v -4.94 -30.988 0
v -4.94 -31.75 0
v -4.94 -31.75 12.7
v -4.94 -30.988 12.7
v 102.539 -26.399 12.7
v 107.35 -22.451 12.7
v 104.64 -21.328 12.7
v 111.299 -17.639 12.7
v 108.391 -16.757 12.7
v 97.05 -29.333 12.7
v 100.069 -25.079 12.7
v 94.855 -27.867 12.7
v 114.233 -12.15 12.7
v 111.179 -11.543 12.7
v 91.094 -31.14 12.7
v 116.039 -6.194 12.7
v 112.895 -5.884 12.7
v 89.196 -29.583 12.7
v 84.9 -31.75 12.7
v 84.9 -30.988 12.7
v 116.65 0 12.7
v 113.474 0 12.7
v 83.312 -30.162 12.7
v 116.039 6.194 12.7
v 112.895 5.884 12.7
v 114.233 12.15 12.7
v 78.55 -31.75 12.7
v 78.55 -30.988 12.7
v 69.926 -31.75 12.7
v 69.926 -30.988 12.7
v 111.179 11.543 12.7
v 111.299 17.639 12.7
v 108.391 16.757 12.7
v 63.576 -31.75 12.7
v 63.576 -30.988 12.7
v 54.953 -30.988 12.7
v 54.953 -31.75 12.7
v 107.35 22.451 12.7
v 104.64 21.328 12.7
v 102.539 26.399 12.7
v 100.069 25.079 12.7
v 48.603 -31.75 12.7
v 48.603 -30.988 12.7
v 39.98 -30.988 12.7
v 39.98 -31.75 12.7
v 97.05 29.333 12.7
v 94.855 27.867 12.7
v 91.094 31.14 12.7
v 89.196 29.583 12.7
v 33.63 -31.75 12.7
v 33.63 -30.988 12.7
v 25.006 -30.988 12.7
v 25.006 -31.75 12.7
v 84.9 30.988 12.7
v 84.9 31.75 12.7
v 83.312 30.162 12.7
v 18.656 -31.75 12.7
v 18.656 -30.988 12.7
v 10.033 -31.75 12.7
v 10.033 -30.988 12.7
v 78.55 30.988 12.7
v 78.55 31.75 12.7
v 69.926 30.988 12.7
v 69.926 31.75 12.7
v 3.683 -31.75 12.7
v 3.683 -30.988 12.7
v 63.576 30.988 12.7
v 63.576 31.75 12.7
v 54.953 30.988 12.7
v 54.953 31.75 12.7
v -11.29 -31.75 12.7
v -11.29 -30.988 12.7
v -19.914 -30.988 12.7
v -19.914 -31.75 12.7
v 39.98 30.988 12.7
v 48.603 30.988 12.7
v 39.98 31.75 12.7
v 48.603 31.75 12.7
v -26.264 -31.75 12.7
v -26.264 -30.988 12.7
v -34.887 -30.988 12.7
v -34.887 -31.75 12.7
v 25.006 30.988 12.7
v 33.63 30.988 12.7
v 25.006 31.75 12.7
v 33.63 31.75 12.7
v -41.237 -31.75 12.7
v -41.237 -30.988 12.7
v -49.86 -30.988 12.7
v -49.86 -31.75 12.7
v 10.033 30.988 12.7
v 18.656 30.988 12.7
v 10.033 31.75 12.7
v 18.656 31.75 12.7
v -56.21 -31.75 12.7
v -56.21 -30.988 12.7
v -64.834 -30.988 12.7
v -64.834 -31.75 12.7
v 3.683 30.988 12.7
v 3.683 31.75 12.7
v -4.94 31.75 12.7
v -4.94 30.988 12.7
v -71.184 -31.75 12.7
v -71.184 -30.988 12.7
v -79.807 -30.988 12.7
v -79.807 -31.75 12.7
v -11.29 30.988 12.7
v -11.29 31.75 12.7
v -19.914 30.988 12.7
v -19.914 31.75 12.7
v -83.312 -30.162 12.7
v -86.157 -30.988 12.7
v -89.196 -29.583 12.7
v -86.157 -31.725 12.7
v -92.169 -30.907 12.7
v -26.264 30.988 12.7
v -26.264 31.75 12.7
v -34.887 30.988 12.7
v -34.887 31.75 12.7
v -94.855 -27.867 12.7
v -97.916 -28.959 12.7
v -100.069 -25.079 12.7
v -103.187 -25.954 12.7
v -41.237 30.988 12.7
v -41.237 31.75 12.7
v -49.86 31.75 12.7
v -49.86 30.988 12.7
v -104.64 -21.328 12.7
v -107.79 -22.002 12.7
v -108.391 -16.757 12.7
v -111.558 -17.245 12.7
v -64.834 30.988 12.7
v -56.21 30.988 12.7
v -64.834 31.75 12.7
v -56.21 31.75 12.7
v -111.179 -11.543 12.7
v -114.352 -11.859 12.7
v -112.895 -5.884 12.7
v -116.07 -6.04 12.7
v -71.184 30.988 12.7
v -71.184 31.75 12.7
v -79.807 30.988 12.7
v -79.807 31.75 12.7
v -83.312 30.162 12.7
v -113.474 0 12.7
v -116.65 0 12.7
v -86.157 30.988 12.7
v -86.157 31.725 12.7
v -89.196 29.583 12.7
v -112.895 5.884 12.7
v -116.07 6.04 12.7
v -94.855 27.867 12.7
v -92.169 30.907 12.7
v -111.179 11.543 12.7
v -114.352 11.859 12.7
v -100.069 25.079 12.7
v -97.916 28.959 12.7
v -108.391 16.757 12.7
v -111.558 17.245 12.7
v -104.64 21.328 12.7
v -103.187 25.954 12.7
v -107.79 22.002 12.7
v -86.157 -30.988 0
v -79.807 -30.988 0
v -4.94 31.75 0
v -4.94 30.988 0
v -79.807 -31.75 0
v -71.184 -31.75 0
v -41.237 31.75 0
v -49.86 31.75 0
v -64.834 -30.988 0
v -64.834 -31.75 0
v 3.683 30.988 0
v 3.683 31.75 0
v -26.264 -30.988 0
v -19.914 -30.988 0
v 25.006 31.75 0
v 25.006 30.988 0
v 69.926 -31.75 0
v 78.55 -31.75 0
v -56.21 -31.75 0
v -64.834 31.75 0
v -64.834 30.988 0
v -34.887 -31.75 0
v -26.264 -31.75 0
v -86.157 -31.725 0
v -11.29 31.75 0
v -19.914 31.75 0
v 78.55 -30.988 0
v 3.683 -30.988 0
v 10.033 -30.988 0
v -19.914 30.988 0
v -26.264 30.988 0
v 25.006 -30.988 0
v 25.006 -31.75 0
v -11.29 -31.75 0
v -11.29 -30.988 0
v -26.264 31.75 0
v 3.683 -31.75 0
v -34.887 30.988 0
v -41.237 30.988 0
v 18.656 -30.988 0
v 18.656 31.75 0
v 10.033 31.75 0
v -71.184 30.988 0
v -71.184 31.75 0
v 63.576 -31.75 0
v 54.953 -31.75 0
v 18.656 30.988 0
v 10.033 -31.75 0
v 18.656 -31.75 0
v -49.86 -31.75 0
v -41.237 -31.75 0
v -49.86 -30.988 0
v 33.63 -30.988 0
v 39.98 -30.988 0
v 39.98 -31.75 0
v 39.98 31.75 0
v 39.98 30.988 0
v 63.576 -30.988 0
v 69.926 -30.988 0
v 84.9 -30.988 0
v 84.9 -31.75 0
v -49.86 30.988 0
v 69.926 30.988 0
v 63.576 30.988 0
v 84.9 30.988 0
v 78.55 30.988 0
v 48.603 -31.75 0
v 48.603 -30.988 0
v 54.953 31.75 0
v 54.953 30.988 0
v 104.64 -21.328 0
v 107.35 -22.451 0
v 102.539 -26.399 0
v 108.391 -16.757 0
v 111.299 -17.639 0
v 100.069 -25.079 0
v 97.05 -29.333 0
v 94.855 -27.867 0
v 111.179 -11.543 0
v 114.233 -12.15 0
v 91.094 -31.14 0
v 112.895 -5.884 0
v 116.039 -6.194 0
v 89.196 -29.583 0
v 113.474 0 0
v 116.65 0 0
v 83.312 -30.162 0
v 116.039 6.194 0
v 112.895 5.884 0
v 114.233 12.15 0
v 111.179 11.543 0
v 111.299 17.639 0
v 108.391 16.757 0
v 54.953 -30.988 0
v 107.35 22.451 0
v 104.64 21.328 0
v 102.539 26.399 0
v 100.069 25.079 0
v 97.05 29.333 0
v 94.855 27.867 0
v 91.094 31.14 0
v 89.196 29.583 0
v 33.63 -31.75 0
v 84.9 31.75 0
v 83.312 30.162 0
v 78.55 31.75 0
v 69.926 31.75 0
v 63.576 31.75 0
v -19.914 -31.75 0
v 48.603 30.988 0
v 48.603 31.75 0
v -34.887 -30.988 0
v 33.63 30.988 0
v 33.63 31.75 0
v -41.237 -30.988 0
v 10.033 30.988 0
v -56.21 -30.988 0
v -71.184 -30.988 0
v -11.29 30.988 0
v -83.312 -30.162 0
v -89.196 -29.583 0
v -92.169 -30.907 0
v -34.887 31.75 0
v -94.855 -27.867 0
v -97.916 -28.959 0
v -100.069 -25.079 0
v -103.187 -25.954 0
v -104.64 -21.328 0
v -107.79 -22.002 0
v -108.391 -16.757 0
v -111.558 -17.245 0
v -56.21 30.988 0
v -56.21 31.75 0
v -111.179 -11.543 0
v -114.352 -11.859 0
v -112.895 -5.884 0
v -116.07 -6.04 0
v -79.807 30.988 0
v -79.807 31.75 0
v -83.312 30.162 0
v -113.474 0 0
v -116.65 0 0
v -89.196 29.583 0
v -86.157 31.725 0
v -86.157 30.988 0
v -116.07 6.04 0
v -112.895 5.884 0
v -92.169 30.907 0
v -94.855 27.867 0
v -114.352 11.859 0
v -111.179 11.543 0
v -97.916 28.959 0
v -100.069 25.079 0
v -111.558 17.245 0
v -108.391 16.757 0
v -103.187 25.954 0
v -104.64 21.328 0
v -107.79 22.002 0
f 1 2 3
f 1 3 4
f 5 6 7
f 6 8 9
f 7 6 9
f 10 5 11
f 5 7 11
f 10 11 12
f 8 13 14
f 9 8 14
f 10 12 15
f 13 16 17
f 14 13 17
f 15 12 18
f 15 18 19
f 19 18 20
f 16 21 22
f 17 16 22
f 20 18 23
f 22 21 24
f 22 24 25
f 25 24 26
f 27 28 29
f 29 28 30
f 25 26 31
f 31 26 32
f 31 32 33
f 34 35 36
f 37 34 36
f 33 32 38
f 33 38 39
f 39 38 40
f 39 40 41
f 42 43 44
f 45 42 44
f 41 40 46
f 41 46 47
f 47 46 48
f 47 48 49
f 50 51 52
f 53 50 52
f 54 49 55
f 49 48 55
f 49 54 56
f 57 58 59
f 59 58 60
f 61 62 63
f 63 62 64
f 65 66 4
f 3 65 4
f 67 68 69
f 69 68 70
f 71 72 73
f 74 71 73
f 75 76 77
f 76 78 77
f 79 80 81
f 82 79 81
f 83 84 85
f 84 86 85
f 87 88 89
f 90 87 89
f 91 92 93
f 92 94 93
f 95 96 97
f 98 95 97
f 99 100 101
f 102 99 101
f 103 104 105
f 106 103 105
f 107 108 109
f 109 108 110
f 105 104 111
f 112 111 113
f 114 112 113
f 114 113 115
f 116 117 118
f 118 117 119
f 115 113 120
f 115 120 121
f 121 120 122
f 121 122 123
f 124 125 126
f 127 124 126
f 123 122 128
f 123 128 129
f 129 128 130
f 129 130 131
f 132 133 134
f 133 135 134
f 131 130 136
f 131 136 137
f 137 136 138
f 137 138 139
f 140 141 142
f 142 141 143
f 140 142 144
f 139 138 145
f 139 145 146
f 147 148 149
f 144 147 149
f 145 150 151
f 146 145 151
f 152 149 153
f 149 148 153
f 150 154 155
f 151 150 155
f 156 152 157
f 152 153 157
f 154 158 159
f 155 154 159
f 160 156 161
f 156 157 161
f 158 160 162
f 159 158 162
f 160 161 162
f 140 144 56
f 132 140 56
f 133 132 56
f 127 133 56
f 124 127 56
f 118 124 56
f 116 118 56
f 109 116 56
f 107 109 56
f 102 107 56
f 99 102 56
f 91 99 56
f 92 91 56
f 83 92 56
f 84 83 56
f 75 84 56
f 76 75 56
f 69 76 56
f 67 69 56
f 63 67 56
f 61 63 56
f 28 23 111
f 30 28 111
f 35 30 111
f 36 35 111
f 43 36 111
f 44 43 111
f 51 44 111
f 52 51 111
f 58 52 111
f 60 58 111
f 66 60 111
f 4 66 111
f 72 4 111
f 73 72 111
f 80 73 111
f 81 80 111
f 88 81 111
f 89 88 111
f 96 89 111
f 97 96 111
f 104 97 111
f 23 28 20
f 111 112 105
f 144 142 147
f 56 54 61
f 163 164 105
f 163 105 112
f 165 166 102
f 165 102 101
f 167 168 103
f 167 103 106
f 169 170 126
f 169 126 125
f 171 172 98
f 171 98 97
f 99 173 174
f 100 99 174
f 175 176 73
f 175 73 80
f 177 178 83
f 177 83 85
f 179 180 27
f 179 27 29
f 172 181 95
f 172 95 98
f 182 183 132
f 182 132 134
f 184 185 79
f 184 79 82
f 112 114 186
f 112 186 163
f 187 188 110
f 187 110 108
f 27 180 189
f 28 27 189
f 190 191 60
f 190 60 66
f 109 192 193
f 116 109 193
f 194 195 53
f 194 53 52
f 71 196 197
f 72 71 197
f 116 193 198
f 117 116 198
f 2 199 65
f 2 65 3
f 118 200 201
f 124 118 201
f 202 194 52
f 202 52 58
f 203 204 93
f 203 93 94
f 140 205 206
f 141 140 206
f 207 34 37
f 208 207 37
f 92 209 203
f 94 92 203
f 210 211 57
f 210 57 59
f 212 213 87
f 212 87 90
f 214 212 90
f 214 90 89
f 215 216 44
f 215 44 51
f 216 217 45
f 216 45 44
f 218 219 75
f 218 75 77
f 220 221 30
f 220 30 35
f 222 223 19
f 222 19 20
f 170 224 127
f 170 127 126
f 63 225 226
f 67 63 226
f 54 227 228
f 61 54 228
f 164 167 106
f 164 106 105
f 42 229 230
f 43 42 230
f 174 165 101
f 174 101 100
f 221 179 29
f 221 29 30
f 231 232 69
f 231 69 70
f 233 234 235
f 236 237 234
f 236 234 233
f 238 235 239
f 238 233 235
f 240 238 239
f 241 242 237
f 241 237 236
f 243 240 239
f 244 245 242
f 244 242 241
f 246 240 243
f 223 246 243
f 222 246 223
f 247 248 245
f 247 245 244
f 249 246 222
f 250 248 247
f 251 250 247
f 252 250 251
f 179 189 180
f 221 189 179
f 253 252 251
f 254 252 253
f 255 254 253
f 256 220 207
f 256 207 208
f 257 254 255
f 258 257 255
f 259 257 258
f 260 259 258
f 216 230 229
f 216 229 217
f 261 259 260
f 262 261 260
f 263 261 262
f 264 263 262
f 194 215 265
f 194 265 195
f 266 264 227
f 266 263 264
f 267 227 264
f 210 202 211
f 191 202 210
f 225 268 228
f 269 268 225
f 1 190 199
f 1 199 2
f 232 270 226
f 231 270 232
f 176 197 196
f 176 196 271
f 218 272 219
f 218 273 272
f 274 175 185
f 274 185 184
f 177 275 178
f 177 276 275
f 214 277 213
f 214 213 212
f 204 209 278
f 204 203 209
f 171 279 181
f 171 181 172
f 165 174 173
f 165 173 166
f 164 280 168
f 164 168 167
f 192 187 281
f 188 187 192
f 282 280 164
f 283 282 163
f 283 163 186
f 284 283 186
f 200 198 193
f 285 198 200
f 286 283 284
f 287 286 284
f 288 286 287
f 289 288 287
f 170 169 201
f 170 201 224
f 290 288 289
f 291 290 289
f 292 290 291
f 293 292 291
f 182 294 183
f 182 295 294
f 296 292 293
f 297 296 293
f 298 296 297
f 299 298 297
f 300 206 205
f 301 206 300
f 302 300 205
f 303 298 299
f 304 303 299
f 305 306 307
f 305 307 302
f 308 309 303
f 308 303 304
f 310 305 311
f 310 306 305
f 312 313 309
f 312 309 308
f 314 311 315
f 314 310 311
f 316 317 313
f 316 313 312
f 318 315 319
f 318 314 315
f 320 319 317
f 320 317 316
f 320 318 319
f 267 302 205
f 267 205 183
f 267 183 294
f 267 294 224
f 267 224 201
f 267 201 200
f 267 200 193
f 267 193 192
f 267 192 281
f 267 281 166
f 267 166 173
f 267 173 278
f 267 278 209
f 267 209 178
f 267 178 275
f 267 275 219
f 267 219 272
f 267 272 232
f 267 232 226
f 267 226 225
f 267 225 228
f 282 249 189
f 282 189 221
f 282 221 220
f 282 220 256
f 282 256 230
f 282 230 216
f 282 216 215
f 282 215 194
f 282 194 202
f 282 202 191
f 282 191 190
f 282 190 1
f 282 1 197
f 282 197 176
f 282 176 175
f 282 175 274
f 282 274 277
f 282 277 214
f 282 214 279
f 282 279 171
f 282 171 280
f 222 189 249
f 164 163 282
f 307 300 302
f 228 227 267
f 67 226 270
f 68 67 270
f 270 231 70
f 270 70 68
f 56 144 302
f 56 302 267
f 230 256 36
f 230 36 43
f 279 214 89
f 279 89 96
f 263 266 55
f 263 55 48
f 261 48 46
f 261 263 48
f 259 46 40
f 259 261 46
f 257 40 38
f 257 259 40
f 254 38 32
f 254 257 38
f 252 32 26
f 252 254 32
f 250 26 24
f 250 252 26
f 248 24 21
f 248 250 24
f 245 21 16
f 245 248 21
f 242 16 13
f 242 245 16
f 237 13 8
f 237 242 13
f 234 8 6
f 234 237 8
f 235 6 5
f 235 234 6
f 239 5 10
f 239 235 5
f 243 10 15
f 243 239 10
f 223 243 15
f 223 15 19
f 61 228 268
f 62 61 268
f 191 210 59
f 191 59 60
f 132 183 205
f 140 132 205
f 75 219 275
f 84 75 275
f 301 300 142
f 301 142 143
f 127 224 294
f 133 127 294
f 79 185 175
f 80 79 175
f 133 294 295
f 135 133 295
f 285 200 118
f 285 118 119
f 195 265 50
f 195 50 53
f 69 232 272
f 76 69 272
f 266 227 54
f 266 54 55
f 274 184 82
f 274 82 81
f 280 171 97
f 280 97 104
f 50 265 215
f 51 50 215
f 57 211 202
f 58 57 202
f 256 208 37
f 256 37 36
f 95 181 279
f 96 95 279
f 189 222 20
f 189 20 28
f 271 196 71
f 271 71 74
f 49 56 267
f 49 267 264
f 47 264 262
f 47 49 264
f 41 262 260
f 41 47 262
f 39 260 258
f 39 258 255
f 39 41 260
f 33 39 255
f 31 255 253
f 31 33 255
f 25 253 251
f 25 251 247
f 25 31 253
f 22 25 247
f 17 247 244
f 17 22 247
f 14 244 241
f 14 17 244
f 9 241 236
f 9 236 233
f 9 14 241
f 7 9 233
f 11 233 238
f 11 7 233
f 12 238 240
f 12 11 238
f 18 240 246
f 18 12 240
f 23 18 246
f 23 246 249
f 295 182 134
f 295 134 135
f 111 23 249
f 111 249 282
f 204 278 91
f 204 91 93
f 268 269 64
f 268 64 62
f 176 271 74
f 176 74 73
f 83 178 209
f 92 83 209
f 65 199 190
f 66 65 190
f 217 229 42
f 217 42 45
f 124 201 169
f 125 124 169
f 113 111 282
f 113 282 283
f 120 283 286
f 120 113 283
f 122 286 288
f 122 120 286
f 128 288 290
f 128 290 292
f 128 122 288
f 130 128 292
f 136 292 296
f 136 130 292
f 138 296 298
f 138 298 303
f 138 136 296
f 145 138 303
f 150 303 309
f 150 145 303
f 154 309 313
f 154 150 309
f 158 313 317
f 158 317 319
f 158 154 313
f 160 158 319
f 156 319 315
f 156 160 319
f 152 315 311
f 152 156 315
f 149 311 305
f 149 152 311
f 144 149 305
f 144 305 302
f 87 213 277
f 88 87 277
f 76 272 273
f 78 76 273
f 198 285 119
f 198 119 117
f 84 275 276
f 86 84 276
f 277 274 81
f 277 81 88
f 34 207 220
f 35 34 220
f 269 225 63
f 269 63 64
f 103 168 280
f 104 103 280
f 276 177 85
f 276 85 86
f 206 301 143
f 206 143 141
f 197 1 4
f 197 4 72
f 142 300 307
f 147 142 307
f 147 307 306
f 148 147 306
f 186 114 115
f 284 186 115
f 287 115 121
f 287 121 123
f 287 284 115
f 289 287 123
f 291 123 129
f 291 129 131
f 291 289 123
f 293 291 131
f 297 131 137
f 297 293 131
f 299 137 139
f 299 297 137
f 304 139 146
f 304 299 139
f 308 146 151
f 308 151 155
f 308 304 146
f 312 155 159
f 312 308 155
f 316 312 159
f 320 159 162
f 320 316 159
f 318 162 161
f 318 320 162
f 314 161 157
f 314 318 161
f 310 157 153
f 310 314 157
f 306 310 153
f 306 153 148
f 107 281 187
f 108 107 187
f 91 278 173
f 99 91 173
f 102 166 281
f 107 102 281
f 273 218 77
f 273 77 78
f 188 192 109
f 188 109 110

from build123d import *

# Parameters (mm, degrees)
BOSS_EXTRUDE4_DEPTH = 12.7
CUT_EXTRUDE4_DEPTH  = 12.7
SKETCH13_W          = 6.35
SKETCH13_H          = 0.762
CUT_EXTRUDE5_DEPTH  = 12.7
LPATTERN3_COUNT     = 12
LPATTERN3_PITCH     = 14.9733
SKETCH14_W          = 6.35
SKETCH14_H          = 0.762
CUT_EXTRUDE6_DEPTH  = 12.7
LPATTERN4_COUNT     = 12
LPATTERN4_PITCH     = 14.9733


with BuildPart() as part:
    # Sketch11 → Boss-Extrude4 (new body)
    with BuildSketch(Plane.XY):
        with BuildLine():
            Line((-84.8995, 31.75), (84.8995, 31.75))
            ThreePointArc((84.8995, 31.75), (116.6495, 0), (84.8995, -31.75))
            Line((84.8995, -31.75), (-84.8995, -31.75))
            ThreePointArc((-84.8995, -31.75), (-116.6495, 0), (-84.8995, 31.75))
        make_face()
    extrude(amount=BOSS_EXTRUDE4_DEPTH)

    # Sketch12 → Cut-Extrude4 (cut)
    with BuildSketch(Plane.XY.offset(12.7)):
        with BuildLine():
            Line((-83.312, 30.1625), (83.312, 30.1625))
            ThreePointArc((83.312, 30.1625), (113.4745, 0), (83.312, -30.1625))
            Line((83.312, -30.1625), (-83.312, -30.1625))
            ThreePointArc((-83.312, -30.1625), (-113.4745, 0), (-83.312, 30.1625))
        make_face()
    extrude(amount=-CUT_EXTRUDE4_DEPTH, mode=Mode.SUBTRACT)

    # Sketch13 → Cut-Extrude5 (cut)
    with BuildSketch(Plane(origin=(0, 0, 0), x_dir=(-1, 0, 0), z_dir=(0, 0, -1))):
        with Locations((-81.7245, 31.369)):
            Rectangle(SKETCH13_W, SKETCH13_H)
    cut_extrude5 = extrude(amount=-CUT_EXTRUDE5_DEPTH, mode=Mode.SUBTRACT)

    # LPattern3: Cut-Extrude5 ×12
    with Locations(*[(-i * LPATTERN3_PITCH, 0, 0) for i in range(1, LPATTERN3_COUNT)]):
        add(cut_extrude5, mode=Mode.SUBTRACT)

    # Sketch14 → Cut-Extrude6 (cut)
    with BuildSketch(Plane(origin=(0, 0, 0), x_dir=(-1, 0, 0), z_dir=(0, 0, -1))):
        with Locations((-81.7245, -31.369)):
            Rectangle(SKETCH14_W, SKETCH14_H)
    cut_extrude6 = extrude(amount=-CUT_EXTRUDE6_DEPTH, mode=Mode.SUBTRACT)

    # LPattern4: Cut-Extrude6 ×12
    with Locations(*[(-i * LPATTERN4_PITCH, 0, 0) for i in range(1, LPATTERN4_COUNT)]):
        add(cut_extrude6, mode=Mode.SUBTRACT)


solid = part.part
